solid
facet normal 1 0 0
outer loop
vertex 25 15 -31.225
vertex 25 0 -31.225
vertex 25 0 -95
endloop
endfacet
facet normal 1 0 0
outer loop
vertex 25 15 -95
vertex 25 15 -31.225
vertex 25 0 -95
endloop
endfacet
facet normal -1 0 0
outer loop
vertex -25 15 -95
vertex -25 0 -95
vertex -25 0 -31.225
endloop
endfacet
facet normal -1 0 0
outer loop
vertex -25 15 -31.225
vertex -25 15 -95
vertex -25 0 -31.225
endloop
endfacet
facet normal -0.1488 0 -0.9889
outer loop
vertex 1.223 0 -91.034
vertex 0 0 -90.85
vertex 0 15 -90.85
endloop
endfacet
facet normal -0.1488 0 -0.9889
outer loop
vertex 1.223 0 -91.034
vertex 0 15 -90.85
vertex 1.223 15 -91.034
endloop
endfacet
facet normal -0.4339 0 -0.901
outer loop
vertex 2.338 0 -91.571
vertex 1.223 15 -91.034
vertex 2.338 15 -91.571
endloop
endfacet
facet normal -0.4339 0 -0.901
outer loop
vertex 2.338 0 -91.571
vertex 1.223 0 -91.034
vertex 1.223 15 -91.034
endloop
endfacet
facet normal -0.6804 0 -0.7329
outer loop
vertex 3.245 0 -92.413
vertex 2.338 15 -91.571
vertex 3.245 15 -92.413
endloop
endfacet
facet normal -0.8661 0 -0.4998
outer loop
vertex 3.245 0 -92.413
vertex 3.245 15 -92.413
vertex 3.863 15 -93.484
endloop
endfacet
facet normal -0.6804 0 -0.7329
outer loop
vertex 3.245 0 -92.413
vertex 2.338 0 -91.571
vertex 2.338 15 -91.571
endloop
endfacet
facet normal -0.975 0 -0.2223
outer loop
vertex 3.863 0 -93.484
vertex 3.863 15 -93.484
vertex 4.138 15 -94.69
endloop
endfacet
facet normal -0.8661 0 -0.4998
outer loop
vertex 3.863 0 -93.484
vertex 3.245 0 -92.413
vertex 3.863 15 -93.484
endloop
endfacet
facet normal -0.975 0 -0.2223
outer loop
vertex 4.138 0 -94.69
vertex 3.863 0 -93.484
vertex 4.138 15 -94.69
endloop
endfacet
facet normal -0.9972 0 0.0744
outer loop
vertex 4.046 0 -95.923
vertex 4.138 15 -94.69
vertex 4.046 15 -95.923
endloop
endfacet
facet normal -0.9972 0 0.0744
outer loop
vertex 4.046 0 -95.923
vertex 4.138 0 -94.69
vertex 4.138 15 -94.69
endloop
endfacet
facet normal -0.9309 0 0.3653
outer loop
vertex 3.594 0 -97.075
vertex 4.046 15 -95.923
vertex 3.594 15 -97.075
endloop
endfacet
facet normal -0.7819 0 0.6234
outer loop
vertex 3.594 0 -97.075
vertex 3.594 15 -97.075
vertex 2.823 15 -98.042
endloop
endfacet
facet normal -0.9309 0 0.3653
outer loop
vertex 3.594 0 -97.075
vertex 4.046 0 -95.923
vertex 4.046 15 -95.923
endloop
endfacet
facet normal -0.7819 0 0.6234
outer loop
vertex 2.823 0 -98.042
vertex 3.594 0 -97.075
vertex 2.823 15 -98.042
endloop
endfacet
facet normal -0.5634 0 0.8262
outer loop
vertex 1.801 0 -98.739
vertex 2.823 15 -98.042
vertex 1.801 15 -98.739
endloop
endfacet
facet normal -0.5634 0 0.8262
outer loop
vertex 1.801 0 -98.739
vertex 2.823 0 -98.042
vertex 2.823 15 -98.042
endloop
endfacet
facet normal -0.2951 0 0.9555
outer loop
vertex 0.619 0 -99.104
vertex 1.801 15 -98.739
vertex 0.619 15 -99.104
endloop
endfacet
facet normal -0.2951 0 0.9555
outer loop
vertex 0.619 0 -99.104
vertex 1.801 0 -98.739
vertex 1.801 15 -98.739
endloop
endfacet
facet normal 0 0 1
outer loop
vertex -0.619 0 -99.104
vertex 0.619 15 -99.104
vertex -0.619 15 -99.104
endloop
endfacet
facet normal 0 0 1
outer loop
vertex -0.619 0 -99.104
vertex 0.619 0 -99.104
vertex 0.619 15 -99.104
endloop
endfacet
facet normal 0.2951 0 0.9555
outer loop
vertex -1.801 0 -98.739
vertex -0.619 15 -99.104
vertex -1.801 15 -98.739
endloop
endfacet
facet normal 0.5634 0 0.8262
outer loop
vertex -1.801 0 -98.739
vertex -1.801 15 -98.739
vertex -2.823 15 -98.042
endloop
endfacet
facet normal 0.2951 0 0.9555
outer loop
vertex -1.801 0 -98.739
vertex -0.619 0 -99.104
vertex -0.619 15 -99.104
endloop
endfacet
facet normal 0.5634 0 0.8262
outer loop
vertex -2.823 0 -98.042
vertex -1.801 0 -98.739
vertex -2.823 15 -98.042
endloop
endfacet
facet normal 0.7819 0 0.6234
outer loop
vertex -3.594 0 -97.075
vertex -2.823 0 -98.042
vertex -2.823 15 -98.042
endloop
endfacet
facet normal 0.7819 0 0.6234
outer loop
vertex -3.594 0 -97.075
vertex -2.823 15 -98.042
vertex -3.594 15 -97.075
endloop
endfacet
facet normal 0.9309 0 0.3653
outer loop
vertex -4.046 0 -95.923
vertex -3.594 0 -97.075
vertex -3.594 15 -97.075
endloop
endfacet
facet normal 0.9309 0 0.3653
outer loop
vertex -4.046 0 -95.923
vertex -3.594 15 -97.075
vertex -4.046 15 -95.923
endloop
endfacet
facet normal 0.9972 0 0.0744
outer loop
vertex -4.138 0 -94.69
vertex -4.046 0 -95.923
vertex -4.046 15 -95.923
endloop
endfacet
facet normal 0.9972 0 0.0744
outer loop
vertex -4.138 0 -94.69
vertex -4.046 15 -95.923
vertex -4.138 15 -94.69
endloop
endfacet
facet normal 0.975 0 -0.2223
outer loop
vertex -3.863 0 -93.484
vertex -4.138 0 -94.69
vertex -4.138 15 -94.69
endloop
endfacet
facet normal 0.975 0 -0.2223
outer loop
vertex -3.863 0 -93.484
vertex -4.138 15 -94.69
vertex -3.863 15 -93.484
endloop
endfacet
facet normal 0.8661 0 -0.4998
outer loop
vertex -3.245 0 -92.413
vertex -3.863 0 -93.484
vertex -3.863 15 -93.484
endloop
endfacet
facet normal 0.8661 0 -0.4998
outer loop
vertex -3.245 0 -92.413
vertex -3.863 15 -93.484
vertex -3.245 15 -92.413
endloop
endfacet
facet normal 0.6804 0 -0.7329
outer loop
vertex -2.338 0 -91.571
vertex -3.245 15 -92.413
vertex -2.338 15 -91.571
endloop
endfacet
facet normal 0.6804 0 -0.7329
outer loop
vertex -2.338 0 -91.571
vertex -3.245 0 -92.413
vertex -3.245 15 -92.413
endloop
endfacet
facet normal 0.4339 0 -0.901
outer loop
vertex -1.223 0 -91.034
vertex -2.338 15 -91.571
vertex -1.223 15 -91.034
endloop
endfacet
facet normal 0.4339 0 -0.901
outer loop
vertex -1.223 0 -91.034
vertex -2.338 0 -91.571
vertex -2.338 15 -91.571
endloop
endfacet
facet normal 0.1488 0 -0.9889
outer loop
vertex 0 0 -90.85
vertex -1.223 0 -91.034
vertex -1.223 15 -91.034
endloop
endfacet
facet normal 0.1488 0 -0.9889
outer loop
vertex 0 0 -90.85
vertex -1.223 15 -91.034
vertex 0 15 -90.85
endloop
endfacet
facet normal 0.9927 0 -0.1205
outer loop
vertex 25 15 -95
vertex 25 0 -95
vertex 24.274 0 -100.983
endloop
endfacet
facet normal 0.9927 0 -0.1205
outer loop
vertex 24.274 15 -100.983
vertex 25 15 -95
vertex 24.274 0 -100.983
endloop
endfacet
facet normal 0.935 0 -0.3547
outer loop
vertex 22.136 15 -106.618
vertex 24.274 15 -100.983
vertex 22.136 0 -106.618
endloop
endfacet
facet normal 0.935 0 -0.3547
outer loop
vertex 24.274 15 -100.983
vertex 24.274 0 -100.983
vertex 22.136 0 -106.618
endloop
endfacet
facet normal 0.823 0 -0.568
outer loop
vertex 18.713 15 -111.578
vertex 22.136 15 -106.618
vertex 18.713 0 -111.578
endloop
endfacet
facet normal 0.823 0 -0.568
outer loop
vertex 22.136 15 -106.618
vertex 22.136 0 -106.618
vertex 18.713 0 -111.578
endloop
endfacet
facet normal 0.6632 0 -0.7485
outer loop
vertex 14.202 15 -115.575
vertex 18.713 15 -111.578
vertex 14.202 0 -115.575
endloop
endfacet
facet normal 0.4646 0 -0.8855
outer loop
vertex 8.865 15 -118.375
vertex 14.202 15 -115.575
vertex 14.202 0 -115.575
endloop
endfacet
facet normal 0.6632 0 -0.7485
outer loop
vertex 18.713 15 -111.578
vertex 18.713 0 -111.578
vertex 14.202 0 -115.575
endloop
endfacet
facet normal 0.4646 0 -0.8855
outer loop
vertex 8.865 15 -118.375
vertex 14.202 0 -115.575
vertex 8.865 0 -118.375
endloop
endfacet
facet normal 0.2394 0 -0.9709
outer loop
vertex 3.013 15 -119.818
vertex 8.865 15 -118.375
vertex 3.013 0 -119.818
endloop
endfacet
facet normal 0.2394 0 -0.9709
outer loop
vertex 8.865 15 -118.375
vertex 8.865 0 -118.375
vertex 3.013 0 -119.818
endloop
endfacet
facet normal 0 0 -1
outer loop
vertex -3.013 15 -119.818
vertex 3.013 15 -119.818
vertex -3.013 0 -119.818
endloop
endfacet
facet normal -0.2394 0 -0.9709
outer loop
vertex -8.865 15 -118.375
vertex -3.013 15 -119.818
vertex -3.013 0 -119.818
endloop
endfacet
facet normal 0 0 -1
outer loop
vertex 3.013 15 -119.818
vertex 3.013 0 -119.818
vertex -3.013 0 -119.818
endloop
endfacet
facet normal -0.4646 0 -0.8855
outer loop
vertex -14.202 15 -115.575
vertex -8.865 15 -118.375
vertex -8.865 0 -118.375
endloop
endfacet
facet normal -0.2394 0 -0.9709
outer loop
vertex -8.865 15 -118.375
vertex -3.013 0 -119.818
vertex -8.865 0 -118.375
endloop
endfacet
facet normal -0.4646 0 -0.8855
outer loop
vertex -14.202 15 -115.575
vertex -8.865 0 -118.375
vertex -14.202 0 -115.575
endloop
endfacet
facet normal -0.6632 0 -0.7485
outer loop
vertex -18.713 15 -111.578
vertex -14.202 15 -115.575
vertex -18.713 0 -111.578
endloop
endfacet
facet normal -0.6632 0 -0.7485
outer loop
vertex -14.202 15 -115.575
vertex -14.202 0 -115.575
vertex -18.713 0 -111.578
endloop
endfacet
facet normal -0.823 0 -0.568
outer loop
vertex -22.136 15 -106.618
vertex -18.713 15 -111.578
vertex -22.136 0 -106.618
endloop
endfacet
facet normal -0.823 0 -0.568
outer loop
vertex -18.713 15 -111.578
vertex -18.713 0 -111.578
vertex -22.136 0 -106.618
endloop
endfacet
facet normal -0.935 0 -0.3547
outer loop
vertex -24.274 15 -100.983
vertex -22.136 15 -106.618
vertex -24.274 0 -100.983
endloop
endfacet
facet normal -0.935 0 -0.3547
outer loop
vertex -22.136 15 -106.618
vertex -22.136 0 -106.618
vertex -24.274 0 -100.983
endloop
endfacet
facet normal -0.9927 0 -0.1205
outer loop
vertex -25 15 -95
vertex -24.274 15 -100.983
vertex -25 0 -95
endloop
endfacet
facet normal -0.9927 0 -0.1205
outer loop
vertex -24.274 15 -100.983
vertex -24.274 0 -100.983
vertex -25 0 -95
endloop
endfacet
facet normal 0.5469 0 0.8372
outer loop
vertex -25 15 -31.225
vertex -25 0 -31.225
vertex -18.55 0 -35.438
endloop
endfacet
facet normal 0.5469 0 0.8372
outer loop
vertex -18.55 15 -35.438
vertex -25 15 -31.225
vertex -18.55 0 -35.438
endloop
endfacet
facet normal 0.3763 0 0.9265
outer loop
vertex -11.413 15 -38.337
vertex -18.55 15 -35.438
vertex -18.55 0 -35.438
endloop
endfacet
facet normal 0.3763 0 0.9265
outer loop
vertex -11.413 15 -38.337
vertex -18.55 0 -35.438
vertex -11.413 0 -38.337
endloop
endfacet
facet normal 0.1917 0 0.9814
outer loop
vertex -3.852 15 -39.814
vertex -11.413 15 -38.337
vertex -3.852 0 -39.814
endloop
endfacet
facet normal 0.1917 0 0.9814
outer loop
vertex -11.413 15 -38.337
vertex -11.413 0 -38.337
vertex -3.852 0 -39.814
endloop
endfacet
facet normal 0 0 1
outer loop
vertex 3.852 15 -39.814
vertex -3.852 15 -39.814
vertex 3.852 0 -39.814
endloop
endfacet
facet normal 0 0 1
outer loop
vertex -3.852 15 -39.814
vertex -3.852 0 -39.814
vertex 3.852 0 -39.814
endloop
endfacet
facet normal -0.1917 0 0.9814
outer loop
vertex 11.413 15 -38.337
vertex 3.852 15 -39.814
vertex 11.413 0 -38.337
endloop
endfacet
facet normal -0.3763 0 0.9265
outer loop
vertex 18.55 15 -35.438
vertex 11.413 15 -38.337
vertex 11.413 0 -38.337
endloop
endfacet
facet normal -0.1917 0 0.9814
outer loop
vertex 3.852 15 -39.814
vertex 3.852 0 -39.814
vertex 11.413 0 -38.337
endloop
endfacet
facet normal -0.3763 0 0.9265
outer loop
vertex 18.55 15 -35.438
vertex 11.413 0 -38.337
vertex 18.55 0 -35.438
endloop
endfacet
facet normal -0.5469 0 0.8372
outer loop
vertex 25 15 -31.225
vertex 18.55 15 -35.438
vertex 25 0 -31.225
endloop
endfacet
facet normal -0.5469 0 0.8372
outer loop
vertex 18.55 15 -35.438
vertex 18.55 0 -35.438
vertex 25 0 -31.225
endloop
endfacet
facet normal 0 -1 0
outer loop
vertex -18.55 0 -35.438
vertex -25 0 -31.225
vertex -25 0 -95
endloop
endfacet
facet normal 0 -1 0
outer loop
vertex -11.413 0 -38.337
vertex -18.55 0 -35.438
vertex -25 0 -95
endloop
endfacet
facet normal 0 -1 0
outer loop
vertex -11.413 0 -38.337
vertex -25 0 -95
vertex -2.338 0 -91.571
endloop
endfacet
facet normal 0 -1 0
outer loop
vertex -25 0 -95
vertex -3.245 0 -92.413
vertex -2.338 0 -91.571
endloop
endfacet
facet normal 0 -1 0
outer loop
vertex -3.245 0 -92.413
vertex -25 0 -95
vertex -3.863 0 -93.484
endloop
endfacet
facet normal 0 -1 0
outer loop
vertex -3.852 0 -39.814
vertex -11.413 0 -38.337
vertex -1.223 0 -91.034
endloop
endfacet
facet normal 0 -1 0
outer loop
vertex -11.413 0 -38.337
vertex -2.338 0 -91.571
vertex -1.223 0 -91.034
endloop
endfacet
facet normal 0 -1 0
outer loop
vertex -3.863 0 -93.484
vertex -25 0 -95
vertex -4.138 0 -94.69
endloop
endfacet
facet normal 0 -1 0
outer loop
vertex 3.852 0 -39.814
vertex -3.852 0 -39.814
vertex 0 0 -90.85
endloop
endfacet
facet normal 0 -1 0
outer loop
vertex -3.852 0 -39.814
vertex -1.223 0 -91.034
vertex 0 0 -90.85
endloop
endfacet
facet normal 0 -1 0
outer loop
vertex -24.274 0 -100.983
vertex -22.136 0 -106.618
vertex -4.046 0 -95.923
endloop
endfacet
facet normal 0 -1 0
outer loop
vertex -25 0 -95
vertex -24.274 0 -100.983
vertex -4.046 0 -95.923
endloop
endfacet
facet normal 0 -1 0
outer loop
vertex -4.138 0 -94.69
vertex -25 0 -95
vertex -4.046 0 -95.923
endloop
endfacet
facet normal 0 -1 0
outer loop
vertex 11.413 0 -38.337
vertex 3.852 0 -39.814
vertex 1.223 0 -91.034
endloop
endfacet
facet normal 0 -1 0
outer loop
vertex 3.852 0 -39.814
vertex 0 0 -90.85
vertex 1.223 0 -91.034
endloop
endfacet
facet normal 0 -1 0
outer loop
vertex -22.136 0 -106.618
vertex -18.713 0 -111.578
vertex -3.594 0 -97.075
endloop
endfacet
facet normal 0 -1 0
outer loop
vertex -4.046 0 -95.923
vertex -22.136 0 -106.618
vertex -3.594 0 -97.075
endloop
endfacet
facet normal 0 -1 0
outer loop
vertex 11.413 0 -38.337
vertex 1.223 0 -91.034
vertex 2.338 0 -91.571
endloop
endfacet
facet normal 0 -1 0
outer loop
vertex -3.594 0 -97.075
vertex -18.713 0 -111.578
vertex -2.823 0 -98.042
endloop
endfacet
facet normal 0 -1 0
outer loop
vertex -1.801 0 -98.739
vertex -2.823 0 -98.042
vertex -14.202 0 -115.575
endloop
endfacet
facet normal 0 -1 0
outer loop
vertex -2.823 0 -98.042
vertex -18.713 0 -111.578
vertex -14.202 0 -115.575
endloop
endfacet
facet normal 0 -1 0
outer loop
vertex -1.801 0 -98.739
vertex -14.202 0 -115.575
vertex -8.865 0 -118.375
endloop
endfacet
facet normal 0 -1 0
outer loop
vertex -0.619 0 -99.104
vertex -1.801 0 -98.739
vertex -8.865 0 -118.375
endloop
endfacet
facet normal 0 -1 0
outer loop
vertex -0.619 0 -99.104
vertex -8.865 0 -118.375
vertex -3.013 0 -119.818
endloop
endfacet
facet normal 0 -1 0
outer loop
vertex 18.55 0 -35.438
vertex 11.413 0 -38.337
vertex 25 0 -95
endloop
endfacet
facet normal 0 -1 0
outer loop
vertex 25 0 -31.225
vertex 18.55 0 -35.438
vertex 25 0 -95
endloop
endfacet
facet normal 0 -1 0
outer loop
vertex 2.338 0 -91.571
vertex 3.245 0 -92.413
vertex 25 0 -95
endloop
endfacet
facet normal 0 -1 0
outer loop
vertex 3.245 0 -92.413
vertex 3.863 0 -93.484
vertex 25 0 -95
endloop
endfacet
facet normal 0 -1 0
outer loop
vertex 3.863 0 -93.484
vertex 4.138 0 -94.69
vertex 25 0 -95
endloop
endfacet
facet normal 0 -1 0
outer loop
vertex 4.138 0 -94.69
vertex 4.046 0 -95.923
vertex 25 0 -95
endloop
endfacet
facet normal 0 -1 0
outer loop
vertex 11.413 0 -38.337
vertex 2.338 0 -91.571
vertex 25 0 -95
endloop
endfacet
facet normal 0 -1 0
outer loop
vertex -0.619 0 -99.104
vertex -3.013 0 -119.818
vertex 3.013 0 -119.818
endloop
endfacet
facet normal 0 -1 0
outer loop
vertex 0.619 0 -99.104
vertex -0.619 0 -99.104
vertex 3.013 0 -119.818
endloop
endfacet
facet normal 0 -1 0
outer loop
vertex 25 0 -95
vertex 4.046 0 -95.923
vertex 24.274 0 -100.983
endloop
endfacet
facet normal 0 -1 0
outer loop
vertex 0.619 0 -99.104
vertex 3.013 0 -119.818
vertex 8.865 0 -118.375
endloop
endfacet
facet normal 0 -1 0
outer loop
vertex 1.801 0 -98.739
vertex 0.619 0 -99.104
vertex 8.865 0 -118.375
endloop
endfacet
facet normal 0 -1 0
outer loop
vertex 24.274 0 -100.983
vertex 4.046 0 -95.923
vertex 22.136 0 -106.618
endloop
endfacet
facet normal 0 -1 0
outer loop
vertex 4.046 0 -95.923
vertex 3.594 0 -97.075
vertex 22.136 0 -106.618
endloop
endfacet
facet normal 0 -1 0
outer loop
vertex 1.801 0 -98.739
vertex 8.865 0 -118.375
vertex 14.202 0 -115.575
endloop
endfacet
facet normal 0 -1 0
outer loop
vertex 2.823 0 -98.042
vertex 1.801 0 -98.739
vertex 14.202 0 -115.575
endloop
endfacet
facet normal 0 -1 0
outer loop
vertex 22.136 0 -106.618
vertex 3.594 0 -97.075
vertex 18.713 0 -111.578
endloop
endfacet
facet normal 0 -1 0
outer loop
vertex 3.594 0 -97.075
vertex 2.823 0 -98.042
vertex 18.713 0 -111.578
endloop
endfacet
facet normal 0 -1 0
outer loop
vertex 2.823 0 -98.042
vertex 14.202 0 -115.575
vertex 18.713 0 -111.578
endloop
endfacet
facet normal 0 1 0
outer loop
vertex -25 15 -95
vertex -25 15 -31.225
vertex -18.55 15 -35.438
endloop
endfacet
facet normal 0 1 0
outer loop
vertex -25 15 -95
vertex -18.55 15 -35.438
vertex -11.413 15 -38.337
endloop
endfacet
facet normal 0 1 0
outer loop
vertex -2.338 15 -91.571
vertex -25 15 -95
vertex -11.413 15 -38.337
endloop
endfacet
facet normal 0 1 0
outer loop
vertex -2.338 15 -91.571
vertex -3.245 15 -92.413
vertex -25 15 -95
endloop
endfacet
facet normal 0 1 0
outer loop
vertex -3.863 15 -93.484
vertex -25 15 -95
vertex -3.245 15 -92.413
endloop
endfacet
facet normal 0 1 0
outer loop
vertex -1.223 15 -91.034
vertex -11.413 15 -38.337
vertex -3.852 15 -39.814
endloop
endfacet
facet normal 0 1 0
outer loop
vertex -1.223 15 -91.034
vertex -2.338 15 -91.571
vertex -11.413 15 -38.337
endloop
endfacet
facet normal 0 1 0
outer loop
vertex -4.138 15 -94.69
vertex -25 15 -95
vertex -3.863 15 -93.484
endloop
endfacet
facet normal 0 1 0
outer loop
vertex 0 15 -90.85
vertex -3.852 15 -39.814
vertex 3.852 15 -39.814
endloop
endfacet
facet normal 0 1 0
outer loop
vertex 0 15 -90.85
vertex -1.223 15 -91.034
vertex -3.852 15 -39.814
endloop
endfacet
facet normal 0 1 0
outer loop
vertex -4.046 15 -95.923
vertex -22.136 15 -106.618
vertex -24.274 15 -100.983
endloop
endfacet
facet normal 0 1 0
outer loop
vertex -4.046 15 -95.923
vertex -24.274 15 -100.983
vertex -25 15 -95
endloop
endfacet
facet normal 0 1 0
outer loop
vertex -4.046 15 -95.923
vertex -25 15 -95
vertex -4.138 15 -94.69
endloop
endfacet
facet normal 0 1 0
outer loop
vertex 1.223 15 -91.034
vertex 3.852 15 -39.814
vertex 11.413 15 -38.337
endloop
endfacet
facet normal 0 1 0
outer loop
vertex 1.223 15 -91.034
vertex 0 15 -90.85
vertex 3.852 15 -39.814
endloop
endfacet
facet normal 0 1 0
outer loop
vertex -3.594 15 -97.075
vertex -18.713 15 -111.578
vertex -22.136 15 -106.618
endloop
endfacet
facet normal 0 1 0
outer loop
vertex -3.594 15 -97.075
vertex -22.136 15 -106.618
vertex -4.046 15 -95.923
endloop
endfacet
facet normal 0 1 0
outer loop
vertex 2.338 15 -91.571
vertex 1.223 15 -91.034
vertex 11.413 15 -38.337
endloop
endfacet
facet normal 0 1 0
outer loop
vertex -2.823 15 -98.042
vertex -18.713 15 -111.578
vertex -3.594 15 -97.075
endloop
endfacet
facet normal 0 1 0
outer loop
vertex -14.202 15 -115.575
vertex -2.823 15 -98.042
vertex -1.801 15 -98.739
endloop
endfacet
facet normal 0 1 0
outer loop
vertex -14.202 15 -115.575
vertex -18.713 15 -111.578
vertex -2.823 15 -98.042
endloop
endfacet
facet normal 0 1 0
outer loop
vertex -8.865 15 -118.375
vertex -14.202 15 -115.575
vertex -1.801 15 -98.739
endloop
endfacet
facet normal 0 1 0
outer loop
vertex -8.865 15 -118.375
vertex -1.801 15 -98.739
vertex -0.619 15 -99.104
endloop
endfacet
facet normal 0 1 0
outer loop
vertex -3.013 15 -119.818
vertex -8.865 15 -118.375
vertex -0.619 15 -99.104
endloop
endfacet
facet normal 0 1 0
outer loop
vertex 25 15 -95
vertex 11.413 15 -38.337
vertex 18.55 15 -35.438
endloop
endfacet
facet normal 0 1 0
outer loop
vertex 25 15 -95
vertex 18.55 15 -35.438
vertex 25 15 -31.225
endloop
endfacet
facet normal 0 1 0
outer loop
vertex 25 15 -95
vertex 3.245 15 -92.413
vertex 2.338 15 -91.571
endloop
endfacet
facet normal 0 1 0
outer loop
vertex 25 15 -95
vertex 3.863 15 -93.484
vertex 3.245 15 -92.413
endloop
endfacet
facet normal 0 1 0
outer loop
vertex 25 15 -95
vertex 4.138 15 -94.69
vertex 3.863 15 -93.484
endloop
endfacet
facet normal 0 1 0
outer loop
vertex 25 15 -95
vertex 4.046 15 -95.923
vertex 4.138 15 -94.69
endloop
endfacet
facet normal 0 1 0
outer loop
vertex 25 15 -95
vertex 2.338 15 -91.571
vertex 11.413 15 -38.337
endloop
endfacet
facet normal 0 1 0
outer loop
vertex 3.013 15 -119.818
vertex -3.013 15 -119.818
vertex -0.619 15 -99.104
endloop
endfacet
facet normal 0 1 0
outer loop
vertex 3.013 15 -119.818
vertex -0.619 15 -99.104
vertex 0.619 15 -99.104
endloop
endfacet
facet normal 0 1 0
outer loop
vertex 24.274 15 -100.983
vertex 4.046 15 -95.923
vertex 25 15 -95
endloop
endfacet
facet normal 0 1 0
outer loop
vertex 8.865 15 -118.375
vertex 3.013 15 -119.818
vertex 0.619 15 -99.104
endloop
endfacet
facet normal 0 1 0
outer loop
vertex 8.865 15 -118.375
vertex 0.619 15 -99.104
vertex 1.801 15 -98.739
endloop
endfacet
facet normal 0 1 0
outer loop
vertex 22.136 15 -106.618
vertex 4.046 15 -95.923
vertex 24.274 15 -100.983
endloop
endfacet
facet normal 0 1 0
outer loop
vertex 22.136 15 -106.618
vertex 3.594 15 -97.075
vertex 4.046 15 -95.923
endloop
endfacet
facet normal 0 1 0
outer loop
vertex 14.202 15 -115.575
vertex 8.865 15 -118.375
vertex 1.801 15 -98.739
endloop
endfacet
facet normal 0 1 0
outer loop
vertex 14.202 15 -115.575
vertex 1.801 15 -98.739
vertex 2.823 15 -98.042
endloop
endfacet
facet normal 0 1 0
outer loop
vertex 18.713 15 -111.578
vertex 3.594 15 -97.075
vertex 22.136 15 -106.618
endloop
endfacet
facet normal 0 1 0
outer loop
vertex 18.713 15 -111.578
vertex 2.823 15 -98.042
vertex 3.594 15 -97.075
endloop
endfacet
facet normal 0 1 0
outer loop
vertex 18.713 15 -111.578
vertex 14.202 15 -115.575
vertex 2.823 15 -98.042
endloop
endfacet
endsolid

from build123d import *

# Parameters (mm, degrees)
ESQUISSE1_R        = 4.15
BOSS_EXTRU_1_DEPTH = 15


with BuildPart() as part:
    # Esquisse1 → Boss.-Extru.1 (new body)
    with BuildSketch(Plane(origin=(0, 0, 0), x_dir=(1, 0, 0), z_dir=(0, 1, 0))):
        with BuildLine():
            Line((25, 31.224989992), (25, 95))
            ThreePointArc((25, 95), (0, 120), (-25, 95))
            Line((-25, 95), (-25, 31.224989992))
            ThreePointArc((-25, 31.224989992), (0, 40), (25, 31.224989992))
        make_face()
        with Locations(Location((0, 95, 0), (0, 0, 270))):  # turned: the seam where the file's is
            Circle(ESQUISSE1_R, mode=Mode.SUBTRACT)
    extrude(amount=BOSS_EXTRU_1_DEPTH)


solid = part.part
